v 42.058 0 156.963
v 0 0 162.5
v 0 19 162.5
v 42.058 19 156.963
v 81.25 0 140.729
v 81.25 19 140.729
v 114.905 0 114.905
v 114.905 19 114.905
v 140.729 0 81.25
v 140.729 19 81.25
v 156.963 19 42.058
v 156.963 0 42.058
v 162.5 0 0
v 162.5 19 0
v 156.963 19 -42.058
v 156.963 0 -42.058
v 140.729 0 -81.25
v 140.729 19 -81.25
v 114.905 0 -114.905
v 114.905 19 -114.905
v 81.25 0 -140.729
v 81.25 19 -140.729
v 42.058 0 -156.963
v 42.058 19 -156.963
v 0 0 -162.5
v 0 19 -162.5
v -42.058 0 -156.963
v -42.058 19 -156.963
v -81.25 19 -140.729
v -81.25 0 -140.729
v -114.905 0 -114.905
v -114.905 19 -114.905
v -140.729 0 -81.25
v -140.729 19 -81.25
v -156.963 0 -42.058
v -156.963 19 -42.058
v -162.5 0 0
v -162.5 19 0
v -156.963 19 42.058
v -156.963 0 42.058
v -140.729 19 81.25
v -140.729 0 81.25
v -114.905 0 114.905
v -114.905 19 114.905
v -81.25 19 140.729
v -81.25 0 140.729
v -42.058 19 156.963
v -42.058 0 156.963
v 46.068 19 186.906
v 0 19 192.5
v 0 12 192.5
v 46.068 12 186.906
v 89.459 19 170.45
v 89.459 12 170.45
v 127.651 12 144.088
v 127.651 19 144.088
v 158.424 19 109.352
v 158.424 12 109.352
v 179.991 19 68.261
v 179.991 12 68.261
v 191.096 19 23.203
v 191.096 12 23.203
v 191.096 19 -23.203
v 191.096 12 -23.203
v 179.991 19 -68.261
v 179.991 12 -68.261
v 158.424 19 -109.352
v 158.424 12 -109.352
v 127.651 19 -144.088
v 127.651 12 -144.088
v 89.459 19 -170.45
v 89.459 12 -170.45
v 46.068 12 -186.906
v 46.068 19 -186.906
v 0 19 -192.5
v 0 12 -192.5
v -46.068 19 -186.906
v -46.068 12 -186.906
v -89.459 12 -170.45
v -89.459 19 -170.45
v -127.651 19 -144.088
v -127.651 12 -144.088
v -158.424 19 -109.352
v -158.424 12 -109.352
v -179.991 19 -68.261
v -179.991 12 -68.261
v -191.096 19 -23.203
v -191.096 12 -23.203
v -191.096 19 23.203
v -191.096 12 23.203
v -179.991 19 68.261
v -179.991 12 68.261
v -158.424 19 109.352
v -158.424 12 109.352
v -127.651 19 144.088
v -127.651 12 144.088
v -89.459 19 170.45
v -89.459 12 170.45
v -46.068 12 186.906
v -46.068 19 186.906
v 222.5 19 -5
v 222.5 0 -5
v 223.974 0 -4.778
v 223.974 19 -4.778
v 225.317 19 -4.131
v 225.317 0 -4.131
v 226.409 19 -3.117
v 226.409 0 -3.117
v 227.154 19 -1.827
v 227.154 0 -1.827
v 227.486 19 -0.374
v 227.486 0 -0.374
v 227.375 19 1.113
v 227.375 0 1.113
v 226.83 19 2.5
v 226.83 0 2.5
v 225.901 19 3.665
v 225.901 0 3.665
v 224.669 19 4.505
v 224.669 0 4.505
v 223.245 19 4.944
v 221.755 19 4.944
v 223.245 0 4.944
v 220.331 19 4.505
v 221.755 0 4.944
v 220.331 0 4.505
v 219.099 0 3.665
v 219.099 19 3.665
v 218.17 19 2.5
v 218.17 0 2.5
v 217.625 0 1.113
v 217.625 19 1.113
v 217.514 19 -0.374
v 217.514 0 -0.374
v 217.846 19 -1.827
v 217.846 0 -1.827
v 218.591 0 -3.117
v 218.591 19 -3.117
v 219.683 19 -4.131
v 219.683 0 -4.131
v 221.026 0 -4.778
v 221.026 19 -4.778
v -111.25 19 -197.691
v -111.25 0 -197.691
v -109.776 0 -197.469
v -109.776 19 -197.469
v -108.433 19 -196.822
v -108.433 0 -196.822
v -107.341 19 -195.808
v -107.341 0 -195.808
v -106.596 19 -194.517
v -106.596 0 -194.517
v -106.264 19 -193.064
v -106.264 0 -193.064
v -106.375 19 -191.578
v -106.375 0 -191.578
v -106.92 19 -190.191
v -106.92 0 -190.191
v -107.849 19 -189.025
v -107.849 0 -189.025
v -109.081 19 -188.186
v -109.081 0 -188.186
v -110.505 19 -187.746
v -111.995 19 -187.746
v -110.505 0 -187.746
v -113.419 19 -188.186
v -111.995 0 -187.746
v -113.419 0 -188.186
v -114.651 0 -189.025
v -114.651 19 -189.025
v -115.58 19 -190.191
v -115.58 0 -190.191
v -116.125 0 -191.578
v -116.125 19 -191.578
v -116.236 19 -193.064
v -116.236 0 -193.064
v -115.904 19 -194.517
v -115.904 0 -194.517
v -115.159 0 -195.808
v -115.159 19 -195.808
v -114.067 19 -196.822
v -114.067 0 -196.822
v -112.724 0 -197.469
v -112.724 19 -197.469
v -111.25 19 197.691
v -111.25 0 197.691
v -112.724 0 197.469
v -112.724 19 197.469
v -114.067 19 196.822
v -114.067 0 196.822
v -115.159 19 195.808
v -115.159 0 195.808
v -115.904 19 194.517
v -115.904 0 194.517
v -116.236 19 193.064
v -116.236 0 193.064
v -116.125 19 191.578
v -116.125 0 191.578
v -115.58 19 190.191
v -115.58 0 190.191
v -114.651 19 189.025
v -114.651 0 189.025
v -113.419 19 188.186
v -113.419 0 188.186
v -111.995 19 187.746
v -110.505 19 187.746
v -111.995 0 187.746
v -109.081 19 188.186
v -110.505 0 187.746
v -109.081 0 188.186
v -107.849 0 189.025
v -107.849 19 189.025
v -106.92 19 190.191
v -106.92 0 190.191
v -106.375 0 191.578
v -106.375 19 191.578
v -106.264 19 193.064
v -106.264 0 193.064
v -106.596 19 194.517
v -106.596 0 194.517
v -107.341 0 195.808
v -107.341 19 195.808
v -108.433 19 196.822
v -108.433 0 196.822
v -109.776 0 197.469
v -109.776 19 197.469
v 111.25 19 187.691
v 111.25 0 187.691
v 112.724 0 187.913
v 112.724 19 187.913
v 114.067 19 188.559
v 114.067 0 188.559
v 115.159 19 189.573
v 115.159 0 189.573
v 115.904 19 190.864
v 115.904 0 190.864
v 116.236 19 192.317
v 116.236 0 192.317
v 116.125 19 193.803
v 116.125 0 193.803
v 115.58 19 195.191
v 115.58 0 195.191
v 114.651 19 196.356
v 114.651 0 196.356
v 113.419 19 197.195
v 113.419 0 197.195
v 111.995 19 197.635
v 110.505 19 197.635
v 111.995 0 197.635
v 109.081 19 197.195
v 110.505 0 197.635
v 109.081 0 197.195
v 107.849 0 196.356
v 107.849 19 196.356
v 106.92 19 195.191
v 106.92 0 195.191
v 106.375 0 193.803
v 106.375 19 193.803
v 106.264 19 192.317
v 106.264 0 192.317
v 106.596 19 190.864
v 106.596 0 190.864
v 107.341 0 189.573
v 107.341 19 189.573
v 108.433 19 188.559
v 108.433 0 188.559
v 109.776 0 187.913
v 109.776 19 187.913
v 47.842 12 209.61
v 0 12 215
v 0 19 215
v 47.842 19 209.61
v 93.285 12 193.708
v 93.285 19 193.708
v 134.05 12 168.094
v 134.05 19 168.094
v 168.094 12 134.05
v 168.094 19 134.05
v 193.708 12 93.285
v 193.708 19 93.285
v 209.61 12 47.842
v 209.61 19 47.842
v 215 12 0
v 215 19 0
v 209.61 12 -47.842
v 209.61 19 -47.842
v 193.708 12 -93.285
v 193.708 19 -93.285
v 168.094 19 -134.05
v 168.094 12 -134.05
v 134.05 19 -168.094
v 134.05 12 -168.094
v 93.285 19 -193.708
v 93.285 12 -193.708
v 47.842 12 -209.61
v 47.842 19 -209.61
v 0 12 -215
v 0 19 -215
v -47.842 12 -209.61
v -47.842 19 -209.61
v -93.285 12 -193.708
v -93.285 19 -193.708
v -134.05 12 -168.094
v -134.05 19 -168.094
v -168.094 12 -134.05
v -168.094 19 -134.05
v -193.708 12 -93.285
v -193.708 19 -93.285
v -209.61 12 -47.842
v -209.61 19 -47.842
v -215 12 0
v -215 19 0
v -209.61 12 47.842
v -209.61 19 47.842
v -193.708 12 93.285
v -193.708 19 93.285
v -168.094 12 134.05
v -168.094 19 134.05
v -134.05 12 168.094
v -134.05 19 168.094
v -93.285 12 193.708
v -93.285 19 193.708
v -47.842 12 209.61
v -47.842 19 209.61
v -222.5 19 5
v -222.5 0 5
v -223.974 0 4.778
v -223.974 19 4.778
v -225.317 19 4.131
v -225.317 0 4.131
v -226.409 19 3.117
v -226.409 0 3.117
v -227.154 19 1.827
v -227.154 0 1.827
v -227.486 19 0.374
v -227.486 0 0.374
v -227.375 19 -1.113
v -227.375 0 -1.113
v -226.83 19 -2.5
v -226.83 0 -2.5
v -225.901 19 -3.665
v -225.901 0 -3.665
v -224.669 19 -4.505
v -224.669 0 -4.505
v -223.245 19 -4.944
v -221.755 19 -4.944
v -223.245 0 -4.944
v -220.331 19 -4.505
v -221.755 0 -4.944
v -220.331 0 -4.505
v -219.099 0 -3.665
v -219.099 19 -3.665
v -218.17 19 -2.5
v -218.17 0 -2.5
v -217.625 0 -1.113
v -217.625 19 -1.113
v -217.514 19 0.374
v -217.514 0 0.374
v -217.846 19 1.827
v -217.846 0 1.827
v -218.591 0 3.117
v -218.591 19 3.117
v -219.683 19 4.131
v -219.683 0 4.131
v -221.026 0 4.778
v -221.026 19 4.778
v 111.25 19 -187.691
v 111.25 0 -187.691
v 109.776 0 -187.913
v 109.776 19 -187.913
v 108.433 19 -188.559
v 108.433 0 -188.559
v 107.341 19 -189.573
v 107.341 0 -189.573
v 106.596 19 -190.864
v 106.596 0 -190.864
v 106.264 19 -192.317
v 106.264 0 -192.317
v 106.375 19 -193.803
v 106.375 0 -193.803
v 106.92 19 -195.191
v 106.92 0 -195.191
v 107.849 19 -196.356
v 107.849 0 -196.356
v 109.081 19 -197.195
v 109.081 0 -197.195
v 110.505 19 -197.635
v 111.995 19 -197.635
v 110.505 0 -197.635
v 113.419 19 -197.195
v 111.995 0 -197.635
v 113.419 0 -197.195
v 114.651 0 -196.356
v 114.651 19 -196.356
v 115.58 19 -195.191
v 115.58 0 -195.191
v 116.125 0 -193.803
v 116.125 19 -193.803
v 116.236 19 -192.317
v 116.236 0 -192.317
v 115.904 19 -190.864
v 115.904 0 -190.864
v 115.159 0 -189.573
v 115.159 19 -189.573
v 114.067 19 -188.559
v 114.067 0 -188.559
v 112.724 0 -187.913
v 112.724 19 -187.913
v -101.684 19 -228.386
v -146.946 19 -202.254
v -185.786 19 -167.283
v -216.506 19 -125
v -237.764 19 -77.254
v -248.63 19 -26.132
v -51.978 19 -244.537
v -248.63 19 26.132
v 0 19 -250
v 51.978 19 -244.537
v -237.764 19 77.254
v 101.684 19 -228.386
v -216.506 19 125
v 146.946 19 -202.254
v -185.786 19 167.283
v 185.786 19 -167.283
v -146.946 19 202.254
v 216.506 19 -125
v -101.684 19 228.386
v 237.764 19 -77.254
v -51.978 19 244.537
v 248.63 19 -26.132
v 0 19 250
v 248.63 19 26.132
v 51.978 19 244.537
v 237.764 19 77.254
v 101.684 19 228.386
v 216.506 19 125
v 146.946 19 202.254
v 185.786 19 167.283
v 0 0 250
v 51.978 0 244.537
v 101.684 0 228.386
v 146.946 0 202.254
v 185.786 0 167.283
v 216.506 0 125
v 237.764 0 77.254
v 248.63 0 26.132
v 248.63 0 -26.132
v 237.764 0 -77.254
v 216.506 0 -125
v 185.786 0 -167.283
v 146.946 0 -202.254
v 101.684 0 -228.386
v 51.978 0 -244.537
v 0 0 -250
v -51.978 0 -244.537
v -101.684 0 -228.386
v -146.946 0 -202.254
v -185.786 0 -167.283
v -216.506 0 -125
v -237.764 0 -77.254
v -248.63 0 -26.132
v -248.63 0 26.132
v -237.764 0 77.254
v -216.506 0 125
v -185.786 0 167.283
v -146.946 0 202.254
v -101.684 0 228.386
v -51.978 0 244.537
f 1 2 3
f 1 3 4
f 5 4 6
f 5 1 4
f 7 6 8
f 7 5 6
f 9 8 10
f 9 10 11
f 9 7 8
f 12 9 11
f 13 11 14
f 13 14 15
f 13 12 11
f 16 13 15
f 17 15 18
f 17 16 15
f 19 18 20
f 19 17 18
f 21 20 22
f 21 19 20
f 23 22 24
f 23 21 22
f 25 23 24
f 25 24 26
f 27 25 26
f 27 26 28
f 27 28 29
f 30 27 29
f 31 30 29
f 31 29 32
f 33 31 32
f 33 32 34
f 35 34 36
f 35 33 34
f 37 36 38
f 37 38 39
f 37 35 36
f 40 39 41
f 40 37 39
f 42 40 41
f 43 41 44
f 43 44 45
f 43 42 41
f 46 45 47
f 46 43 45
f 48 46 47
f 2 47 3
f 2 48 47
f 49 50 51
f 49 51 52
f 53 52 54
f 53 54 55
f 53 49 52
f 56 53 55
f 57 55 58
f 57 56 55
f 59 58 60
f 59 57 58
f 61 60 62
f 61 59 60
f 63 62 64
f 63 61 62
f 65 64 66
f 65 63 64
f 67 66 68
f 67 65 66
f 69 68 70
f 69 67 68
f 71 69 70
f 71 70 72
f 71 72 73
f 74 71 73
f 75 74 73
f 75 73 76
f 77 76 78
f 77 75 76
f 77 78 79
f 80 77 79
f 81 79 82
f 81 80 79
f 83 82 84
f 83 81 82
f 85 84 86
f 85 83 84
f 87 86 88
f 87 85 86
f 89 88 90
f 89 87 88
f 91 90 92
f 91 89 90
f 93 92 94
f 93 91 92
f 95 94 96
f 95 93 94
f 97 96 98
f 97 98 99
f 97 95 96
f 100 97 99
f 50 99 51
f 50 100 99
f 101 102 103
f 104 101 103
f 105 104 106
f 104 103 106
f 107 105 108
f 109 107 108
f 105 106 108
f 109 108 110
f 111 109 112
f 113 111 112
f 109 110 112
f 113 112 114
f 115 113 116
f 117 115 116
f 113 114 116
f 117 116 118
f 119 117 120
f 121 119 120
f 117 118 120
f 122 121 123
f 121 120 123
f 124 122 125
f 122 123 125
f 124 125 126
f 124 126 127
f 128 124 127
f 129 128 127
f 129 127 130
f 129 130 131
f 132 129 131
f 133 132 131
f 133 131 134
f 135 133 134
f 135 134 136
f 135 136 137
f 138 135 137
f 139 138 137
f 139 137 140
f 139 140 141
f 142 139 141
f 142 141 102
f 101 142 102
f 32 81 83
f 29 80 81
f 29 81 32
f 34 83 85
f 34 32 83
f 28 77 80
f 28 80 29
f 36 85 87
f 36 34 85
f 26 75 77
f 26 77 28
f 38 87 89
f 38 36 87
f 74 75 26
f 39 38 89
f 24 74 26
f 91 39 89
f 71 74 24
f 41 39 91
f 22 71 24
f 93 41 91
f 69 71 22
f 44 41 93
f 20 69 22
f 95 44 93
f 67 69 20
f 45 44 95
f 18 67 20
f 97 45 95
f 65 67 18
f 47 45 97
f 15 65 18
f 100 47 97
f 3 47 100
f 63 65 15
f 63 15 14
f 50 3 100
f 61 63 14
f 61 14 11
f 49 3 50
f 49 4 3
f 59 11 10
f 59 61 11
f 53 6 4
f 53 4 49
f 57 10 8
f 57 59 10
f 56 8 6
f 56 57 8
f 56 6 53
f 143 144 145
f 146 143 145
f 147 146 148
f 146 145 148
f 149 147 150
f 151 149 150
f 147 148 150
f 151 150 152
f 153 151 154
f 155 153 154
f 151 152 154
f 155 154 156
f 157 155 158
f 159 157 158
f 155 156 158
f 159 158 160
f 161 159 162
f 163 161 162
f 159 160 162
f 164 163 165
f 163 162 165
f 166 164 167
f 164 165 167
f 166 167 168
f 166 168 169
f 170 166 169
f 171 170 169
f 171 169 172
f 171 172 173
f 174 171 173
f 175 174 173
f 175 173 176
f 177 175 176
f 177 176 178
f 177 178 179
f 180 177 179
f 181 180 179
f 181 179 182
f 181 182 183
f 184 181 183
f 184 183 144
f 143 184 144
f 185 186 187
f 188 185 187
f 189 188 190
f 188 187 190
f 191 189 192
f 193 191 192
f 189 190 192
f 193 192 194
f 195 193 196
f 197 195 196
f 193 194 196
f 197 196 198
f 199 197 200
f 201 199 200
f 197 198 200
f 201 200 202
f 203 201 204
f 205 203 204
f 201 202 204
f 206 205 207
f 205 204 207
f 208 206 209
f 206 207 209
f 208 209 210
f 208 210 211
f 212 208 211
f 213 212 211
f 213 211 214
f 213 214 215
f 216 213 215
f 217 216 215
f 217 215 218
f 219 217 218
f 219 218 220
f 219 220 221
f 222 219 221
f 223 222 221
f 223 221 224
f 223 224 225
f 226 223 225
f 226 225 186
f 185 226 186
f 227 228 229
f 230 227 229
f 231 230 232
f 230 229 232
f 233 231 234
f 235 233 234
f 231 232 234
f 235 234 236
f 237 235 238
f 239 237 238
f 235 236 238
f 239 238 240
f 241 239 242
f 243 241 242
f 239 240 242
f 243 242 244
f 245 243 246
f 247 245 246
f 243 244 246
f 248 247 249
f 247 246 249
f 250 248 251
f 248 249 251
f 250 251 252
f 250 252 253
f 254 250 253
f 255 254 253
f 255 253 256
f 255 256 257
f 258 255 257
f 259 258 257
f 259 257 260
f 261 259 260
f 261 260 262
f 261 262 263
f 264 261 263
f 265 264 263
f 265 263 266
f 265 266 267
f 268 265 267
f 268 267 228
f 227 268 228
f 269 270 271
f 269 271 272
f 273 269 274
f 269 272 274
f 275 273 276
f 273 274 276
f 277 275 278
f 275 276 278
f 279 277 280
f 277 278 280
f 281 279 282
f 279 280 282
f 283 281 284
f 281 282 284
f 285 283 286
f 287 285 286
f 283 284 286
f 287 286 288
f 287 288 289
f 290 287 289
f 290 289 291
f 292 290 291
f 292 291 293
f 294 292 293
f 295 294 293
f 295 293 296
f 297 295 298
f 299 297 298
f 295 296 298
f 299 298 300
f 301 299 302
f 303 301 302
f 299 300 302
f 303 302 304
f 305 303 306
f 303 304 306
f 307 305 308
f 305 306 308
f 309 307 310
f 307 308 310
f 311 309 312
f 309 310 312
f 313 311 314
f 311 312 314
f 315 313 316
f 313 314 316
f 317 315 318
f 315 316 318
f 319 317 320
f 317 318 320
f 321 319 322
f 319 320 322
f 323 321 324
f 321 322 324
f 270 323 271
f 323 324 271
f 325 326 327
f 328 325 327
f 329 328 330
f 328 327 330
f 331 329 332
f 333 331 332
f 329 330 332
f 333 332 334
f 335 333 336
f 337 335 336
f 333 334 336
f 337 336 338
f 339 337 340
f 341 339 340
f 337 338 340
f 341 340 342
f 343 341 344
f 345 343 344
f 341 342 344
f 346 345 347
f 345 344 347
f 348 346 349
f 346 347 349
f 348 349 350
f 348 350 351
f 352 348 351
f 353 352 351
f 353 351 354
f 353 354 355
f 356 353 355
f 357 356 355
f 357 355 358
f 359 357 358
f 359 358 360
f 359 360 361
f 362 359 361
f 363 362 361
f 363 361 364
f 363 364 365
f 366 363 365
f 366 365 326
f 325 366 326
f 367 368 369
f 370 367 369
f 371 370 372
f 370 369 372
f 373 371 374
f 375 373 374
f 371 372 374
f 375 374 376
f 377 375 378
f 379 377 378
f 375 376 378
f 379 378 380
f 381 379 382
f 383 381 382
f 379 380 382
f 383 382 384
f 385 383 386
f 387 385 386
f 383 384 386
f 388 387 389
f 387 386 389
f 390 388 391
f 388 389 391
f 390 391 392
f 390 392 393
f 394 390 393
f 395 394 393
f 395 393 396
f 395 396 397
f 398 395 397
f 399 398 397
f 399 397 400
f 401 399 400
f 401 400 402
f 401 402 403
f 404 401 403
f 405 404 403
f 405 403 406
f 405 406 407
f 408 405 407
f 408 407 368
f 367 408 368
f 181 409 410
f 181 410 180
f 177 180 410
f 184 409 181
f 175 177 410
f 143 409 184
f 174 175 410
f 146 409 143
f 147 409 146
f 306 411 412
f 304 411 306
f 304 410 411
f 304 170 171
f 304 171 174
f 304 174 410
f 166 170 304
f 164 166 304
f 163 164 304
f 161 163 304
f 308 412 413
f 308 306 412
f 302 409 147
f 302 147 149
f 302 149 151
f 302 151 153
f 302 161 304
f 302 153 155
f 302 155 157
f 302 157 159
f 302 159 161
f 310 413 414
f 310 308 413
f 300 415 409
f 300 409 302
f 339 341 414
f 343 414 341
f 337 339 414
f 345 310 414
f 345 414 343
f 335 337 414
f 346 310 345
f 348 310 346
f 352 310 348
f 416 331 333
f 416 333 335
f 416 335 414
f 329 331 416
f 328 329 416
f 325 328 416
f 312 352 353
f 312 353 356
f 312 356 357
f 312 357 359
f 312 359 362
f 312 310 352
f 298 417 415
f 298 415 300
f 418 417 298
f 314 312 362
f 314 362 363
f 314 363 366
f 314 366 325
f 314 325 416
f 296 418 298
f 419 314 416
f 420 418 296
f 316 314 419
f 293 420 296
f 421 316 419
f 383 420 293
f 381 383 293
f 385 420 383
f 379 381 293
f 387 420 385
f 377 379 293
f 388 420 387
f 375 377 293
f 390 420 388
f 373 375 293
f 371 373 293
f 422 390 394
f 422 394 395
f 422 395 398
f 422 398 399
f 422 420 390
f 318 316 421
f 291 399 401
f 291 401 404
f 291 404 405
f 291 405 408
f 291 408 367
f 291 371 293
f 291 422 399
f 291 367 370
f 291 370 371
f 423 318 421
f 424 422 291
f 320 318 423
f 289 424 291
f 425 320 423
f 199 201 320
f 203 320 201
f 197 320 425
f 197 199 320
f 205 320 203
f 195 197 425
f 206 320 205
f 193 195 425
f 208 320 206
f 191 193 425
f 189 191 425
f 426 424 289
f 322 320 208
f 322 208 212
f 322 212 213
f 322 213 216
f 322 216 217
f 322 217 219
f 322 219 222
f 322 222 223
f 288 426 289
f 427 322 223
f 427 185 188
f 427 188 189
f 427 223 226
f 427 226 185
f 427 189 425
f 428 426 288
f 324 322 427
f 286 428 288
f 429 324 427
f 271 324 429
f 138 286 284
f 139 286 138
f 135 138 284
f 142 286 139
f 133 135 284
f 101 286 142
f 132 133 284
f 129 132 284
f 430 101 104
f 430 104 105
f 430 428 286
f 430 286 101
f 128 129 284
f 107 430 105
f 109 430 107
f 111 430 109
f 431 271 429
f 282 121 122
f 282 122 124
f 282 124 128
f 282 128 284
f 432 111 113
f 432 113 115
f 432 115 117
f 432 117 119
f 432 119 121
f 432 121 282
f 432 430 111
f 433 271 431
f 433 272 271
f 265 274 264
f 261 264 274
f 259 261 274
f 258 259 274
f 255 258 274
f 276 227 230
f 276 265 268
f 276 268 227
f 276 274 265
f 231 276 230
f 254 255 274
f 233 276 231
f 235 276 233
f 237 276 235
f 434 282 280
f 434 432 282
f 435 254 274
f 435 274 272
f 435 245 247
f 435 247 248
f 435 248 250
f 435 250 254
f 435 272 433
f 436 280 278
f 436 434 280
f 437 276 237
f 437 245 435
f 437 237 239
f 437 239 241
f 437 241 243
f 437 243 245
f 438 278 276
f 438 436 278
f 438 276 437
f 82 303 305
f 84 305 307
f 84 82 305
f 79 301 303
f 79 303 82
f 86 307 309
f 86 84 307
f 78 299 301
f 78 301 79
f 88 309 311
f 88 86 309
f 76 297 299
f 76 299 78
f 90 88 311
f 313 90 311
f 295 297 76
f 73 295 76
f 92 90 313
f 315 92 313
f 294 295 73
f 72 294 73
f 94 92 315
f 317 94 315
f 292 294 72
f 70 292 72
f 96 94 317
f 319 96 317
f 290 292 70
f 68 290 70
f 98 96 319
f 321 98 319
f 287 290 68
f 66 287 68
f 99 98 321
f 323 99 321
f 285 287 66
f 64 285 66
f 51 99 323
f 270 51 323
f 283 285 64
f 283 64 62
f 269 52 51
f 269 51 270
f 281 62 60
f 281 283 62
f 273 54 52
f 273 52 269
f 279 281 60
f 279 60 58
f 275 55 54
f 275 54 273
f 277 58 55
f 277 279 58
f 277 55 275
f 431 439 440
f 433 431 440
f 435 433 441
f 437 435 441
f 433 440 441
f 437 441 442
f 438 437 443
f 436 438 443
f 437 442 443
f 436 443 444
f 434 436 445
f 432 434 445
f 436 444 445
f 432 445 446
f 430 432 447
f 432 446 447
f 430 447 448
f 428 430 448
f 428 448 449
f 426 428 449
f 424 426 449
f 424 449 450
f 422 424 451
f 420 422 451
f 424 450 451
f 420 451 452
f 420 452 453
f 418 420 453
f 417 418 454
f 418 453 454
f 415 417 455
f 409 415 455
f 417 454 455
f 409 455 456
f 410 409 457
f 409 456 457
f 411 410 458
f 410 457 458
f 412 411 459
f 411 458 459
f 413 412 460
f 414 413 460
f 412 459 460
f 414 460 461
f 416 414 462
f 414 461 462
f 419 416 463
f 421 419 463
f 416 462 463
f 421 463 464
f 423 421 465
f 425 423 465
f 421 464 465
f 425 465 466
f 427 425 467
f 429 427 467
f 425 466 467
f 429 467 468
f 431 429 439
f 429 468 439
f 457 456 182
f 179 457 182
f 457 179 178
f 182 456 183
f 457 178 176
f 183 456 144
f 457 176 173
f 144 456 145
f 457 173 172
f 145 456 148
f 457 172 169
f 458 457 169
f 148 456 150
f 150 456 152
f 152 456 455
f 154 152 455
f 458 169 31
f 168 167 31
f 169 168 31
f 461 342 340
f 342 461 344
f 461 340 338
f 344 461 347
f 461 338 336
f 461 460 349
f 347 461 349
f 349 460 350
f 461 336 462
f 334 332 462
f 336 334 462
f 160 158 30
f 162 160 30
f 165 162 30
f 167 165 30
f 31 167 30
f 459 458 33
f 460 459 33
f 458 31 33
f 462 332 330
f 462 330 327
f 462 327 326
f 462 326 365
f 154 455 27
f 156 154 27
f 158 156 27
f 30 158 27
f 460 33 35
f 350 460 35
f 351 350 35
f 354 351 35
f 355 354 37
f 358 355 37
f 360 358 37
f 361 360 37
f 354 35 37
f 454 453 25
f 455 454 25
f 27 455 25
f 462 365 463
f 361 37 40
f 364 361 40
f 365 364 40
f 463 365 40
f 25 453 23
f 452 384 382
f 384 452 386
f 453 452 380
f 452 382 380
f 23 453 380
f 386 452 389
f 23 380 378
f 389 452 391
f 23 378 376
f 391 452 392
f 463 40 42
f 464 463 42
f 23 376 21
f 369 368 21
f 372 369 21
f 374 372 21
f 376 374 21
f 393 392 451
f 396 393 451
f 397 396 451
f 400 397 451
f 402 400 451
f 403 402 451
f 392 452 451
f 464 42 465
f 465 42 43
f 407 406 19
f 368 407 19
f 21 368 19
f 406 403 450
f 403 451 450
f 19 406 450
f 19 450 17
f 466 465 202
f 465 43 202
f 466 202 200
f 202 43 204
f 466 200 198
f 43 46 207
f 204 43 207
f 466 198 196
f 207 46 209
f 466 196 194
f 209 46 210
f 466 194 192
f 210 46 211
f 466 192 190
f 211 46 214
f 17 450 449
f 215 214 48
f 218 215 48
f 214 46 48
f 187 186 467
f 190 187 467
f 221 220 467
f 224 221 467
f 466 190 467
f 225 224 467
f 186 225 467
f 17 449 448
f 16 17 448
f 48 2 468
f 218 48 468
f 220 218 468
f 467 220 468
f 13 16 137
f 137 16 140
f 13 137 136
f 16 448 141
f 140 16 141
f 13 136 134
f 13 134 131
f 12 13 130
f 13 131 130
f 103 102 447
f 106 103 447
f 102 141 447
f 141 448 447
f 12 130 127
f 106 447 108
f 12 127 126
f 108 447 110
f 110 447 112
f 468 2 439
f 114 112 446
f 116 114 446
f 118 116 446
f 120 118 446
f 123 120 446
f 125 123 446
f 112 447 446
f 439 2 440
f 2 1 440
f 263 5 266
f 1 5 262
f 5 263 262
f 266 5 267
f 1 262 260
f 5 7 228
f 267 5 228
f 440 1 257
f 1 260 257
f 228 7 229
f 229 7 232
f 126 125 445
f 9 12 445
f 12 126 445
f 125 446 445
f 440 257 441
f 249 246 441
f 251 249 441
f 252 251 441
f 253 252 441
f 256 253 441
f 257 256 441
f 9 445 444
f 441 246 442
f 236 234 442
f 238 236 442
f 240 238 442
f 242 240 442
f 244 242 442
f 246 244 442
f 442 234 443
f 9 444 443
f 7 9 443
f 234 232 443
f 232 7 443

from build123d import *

# Parameters (mm, degrees)
SKETCH1_R           = 250
SKETCH1_R_2         = 162.5
BOSS_EXTRUDE1_DEPTH = 19
SKETCH2_R           = 215
SKETCH2_R_2         = 192.5
CUT_EXTRUDE1_DEPTH  = 7
SKETCH3_R           = 5
CUT_EXTRUDE2_DEPTH  = 355.063553617


with BuildPart() as part:
    # Sketch1 → Boss-Extrude1 (new body)
    with BuildSketch(Plane(origin=(0, 0, 0), x_dir=(1, 0, 0), z_dir=(0, 1, 0))):
        with Locations(Location((0, 0, 0), (0, 0, 270))):
            Circle(SKETCH1_R)
        with Locations(Location((0, 0, 0), (0, 0, 270))):
            Circle(SKETCH1_R_2, mode=Mode.SUBTRACT)
    extrude(amount=BOSS_EXTRUDE1_DEPTH)

    # Sketch2 → Cut-Extrude1 (cut)
    with BuildSketch(Plane(origin=(0, 19, 0), x_dir=(1, 0, 0), z_dir=(0, 1, 0))):
        with Locations(Location((0, 0, 0), (0, 0, 270))):
            Circle(SKETCH2_R)
        with Locations(Location((0, 0, 0), (0, 0, 270))):
            Circle(SKETCH2_R_2, mode=Mode.SUBTRACT)
    extrude(amount=-CUT_EXTRUDE1_DEPTH, mode=Mode.SUBTRACT)

    # Sketch3 → Cut-Extrude2 (cut, through all)
    with BuildSketch(Plane.XZ):
        with Locations(Location((111.25, 192.690652342, 0), (0, 0, 270))):
            Circle(SKETCH3_R)
        with Locations(Location((222.5, 0, 0), (0, 0, 270))):
            Circle(SKETCH3_R)
        with Locations(Location((-222.5, 0, 0), (0, 0, 90))):
            Circle(SKETCH3_R)
        with Locations(Location((-111.25, 192.690652342, 0), (0, 0, 90))):
            Circle(SKETCH3_R)
        with Locations(Location((111.25, -192.690652342, 0), (0, 0, 90))):
            Circle(SKETCH3_R)
        with Locations(Location((-111.25, -192.690652342, 0), (0, 0, 270))):
            Circle(SKETCH3_R)
    extrude(amount=-CUT_EXTRUDE2_DEPTH, mode=Mode.SUBTRACT)


solid = part.part
